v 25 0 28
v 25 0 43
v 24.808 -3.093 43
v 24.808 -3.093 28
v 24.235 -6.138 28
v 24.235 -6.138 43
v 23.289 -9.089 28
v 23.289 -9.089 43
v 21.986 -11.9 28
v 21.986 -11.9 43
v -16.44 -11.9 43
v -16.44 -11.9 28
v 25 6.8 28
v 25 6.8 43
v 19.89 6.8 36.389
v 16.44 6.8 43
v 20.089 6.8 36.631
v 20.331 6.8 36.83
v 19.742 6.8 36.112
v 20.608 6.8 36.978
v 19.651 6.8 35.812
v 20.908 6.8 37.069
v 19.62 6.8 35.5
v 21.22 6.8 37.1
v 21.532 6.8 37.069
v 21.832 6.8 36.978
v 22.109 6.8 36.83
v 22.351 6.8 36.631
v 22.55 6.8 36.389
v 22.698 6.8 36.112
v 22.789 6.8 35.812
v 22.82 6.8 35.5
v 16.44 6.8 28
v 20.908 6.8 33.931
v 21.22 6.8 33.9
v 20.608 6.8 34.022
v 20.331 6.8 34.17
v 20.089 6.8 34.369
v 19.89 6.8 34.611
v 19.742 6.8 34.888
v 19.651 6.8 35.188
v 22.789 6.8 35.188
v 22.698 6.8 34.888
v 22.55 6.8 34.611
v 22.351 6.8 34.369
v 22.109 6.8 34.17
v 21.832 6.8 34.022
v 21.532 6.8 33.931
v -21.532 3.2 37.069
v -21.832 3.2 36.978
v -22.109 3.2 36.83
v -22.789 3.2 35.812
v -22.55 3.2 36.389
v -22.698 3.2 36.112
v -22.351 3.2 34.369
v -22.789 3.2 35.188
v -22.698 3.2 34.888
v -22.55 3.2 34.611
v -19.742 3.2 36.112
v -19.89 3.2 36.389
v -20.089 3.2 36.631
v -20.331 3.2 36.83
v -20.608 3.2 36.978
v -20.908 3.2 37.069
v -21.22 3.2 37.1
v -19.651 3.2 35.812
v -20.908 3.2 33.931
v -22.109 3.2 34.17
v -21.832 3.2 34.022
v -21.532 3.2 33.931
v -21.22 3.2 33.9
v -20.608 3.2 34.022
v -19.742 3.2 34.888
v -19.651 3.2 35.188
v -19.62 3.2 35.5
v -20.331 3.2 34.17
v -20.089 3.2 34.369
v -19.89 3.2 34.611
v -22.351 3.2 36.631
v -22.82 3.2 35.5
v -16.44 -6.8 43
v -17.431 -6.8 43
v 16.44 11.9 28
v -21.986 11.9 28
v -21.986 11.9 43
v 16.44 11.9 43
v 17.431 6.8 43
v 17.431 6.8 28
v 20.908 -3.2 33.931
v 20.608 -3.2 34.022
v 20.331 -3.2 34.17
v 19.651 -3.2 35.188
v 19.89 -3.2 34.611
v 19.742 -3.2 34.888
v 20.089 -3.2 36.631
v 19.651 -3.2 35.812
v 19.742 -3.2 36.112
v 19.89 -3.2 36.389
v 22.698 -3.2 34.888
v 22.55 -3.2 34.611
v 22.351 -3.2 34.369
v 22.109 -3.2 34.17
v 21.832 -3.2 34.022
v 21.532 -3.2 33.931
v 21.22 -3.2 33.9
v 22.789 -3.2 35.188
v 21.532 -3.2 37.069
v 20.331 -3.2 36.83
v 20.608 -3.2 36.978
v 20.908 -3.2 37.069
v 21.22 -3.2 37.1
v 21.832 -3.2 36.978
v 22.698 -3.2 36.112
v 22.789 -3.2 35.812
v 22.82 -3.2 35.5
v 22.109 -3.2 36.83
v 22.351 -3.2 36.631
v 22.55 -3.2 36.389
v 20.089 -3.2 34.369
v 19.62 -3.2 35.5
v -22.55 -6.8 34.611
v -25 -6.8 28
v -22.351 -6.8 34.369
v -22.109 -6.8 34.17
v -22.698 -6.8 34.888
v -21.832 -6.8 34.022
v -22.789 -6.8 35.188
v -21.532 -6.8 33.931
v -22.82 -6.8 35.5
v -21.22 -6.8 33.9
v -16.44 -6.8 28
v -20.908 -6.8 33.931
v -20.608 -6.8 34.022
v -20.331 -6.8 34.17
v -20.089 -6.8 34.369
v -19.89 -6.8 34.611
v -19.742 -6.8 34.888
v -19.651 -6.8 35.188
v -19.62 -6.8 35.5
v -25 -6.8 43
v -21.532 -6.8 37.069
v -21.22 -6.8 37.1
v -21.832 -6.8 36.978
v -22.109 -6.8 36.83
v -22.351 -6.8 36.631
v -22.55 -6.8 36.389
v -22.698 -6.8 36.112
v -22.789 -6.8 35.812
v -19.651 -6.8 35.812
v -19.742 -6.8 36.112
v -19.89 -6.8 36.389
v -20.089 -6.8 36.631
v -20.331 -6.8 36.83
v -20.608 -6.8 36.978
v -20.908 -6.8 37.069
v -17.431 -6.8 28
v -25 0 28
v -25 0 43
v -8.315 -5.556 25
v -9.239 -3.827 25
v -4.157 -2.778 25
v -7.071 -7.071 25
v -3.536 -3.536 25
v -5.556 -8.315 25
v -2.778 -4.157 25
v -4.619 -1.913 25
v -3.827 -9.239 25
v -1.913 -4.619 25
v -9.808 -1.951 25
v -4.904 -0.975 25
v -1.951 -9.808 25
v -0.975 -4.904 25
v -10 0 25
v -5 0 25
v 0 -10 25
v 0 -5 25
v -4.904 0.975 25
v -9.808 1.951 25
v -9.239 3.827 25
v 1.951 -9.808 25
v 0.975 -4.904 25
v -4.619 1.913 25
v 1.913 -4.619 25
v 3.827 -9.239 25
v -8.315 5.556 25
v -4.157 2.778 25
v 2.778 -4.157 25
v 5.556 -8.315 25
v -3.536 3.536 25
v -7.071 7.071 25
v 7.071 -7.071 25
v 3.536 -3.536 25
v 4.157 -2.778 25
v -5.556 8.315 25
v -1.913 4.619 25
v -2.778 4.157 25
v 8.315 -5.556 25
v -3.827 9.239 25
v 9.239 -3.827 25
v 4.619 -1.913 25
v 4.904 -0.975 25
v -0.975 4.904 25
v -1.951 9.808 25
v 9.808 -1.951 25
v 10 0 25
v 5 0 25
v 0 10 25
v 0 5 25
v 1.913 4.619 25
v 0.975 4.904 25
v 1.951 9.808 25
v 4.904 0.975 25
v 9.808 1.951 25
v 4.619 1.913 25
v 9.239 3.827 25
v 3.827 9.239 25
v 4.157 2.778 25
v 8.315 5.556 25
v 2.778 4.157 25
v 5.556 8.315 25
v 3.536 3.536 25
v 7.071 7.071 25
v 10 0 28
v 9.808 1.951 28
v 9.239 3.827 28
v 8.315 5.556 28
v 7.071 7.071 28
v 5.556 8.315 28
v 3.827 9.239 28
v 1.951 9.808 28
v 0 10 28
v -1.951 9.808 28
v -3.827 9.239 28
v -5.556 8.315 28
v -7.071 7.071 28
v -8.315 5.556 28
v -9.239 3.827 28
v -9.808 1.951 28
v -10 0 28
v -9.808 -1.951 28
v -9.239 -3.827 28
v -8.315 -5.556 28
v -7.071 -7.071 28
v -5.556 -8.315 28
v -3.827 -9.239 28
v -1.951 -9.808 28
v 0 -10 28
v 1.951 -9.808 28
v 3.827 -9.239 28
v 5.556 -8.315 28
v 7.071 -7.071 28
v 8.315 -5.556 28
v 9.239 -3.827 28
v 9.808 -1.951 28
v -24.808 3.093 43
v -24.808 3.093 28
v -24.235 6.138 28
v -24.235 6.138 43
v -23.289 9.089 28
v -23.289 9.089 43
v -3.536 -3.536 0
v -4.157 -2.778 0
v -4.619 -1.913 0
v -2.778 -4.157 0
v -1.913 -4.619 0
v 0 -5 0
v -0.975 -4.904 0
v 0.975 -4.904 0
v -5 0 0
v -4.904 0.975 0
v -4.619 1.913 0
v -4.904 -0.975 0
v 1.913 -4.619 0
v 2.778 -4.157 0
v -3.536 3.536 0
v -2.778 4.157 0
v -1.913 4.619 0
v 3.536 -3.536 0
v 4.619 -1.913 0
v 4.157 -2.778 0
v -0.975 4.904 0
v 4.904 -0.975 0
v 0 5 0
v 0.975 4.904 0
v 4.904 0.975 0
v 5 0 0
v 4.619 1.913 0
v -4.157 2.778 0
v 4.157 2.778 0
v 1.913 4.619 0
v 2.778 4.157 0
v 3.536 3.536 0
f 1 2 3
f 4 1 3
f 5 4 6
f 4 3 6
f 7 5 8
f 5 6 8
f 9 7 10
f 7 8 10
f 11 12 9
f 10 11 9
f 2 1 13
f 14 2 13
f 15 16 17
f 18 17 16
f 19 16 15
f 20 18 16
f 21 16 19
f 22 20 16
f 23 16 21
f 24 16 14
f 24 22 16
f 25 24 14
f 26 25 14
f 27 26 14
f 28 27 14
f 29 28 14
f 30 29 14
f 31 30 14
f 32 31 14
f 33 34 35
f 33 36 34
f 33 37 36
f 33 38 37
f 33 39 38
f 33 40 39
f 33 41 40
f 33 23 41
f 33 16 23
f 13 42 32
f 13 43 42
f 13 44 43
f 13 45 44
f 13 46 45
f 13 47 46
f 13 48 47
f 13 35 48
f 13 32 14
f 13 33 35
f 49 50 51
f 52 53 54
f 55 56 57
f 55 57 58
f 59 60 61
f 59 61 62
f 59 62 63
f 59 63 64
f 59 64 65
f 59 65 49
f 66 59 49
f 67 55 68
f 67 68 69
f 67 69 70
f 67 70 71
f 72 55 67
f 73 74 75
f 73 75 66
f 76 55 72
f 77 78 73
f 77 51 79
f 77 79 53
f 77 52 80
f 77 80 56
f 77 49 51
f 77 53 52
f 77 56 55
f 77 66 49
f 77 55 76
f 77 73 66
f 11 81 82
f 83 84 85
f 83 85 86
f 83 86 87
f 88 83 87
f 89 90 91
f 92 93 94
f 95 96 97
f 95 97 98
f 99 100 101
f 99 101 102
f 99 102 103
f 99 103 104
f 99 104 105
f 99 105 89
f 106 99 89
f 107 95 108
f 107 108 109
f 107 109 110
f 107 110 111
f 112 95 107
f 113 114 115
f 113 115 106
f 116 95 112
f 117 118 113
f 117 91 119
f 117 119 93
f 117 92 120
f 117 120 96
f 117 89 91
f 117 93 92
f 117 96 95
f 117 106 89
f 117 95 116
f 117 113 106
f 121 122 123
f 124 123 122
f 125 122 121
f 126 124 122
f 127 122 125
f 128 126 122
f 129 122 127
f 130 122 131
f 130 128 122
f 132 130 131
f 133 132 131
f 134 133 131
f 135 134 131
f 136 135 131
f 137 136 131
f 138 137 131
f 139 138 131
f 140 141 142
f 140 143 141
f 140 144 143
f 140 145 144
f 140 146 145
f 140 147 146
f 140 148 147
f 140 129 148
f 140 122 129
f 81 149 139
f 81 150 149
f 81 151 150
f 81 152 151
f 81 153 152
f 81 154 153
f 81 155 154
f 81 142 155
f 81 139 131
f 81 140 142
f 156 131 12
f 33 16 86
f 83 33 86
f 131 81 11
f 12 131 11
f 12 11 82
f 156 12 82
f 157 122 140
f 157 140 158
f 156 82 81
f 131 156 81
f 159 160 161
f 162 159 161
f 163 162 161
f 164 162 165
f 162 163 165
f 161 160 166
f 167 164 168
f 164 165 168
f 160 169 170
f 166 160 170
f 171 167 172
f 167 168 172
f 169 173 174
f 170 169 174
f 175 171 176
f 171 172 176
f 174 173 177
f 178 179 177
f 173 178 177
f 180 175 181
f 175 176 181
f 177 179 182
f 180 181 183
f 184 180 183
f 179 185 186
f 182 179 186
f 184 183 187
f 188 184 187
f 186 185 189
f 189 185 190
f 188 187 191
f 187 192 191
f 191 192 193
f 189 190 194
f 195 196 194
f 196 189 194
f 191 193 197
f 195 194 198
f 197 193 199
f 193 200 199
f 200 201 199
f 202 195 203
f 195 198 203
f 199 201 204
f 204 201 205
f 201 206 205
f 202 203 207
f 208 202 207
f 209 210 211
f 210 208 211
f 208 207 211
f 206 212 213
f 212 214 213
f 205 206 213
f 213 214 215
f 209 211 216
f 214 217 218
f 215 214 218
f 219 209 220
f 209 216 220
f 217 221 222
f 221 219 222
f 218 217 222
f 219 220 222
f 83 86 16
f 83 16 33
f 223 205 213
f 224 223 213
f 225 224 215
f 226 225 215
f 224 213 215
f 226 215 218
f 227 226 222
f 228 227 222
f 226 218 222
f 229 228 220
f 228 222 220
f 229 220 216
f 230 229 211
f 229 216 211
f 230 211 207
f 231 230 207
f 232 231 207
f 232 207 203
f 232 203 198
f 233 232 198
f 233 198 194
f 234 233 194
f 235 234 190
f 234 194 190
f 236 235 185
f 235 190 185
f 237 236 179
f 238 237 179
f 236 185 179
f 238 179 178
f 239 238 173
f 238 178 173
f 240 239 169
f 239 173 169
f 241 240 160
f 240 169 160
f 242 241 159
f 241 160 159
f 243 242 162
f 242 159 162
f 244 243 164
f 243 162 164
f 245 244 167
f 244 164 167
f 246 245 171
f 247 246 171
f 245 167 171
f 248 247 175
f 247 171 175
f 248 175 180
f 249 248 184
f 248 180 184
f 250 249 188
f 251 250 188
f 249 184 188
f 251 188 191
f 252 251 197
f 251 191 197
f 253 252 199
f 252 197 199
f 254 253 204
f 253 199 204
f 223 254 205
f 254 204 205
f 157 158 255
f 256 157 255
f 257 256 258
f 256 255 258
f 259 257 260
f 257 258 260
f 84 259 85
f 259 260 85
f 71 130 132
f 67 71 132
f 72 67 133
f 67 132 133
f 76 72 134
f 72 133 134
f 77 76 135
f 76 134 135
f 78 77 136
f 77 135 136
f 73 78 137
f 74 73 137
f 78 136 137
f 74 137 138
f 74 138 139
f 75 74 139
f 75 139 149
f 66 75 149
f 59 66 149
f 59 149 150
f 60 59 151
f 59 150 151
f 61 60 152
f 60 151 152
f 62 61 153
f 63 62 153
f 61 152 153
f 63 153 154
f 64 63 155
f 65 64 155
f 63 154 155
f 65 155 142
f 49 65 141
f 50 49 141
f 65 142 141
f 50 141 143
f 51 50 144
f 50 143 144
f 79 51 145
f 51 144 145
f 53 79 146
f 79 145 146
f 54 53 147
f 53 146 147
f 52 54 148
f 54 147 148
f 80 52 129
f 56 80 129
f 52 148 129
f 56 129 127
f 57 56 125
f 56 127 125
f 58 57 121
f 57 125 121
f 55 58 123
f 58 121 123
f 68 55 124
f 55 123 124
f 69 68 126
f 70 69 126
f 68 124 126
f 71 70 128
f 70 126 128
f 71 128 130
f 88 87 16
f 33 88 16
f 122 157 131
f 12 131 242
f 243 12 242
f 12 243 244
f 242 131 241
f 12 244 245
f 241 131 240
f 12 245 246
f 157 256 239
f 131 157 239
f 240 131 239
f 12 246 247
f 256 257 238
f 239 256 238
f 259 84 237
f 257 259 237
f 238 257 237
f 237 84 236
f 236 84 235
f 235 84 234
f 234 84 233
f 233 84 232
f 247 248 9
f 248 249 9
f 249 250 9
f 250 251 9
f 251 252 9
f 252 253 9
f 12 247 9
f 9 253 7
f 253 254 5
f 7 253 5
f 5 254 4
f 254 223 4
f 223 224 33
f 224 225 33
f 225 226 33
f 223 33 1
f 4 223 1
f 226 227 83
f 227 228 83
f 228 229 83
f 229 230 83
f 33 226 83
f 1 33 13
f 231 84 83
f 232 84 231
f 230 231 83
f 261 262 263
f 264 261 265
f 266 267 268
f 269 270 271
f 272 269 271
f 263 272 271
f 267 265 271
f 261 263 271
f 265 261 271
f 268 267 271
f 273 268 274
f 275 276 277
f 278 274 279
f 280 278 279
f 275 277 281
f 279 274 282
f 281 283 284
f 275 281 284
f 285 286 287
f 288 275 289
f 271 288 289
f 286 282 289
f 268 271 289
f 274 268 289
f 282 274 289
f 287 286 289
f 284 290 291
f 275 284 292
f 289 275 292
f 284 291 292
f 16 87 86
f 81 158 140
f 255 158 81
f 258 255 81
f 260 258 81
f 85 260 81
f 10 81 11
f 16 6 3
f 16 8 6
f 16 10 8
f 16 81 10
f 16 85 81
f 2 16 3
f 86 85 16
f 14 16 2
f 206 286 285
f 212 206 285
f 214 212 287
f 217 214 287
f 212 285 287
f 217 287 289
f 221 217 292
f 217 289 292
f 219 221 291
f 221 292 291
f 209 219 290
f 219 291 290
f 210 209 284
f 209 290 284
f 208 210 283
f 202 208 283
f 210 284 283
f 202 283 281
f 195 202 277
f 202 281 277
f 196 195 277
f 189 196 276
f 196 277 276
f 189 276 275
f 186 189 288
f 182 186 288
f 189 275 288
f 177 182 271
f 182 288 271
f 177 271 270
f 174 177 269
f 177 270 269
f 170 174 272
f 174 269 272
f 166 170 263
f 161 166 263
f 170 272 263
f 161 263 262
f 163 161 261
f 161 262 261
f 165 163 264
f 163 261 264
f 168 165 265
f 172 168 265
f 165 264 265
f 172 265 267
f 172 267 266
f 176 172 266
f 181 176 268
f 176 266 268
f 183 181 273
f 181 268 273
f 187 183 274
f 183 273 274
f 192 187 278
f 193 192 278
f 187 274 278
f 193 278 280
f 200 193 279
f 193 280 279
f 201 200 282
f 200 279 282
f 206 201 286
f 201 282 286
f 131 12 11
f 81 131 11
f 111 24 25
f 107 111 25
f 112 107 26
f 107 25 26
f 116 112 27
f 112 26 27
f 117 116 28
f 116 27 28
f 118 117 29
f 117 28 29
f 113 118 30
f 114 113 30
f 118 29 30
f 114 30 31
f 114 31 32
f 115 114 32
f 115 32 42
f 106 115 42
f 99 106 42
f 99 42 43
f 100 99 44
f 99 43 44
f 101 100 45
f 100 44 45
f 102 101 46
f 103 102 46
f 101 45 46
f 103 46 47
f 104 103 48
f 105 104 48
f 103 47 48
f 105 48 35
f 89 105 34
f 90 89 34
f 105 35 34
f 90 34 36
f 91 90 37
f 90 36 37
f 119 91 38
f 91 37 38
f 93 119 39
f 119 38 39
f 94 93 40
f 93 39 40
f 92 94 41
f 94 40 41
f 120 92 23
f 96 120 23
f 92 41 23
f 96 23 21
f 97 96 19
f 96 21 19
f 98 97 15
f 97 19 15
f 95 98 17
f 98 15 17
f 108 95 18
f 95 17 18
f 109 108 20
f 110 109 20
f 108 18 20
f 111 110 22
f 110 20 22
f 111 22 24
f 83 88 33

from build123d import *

# Parameters (mm, degrees)
SKETCH_1_R          = 5
EXTRUDE_1_DEPTH     = 25
SKETCH_2_R          = 10
EXTRUDE_2_DEPTH     = 3
SKETCH_3_W          = 50
SKETCH_3_H          = 23.8
EXTRUDE_3_DEPTH     = 15
CUT_EXTRUDE_1_DEPTH = 52.143034716
SKETCH_5_W          = 8.56
SKETCH_5_H          = 15
CUT_EXTRUDE_2_DEPTH = 5.1
SKETCH_6_R          = 1.6
CUT_EXTRUDE_3_DEPTH = 10
SKETCH_7_W          = 8.56
SKETCH_7_H          = 15
CUT_EXTRUDE_4_DEPTH = 5.1
SKETCH_8_R          = 1.6
CUT_EXTRUDE_5_DEPTH = 10
EXTRUDE_4_DEPTH     = 15
EXTRUDE_4_2_DEPTH   = 15


with BuildPart() as part:
    # 草图1 → 凸台-拉伸1 (new body)
    with BuildSketch(Plane.XY):
        Circle(SKETCH_1_R)
    extrude(amount=EXTRUDE_1_DEPTH)

    # 草图2 → 凸台-拉伸2 (add)
    with BuildSketch(Plane.XY.offset(25)):
        Circle(SKETCH_2_R)
    extrude(amount=EXTRUDE_2_DEPTH)

    # 草图3 → 凸台-拉伸3 (add)
    with BuildSketch(Plane.XY.offset(28)):
        Rectangle(SKETCH_3_W, SKETCH_3_H)
    extrude(amount=EXTRUDE_3_DEPTH)

    # 草图4 → 切除-拉伸1 (cut, through all)
    with BuildSketch(Plane.XY.offset(43)):
        with BuildLine():
            Line((-25, 11.9), (-25, 0))
            ThreePointArc((-25, 0), (-24.234823084, 6.137862013), (-21.986131993, 11.9))
            Line((-21.986131993, 11.9), (-25, 11.9))
        make_face()
        with BuildLine():
            Line((21.986131993, -11.9), (25, -11.9))
            Line((25, -11.9), (25, 0))
            ThreePointArc((25, 0), (24.234823084, -6.137862013), (21.986131993, -11.9))
        make_face()
    extrude(amount=-CUT_EXTRUDE_1_DEPTH, mode=Mode.SUBTRACT)

    # 草图5 → 切除-拉伸2 (cut)
    with BuildSketch(Plane(origin=(0, 11.9, 0), x_dir=(1, 0, 0), z_dir=(0, 1, 0))):
        with Locations((20.72, -35.5)):
            Rectangle(SKETCH_5_W, SKETCH_5_H)
    extrude(amount=-CUT_EXTRUDE_2_DEPTH, mode=Mode.SUBTRACT)

    # 草图6 → 切除-拉伸3 (cut)
    with BuildSketch(Plane(origin=(0, 6.8, 0), x_dir=(1, 0, 0), z_dir=(0, 1, 0))):
        with Locations(Location((21.22, -35.5, 0), (0, 0, 270))):
            Circle(SKETCH_6_R)
    extrude(amount=-CUT_EXTRUDE_3_DEPTH, mode=Mode.SUBTRACT)

    # 草图7 → 切除-拉伸4 (cut)
    with BuildSketch(Plane.XZ.offset(11.9)):
        with Locations((-20.72, 35.5)):
            Rectangle(SKETCH_7_W, SKETCH_7_H)
    extrude(amount=-CUT_EXTRUDE_4_DEPTH, mode=Mode.SUBTRACT)

    # 草图8 → 切除-拉伸5 (cut)
    with BuildSketch(Plane.XZ.offset(6.8)):
        with Locations(Location((-21.22, 35.5, 0), (0, 0, 270))):
            Circle(SKETCH_8_R)
    extrude(amount=-CUT_EXTRUDE_5_DEPTH, mode=Mode.SUBTRACT)


with BuildPart() as body_2:
    # 草图9 → 凸台-拉伸4 (new body)
    with BuildSketch(Plane.XY.offset(43)):
        Polygon((16.44, 11.9), (17.431339577, 6.8), (16.44, 6.8), align=None)
    extrude(amount=-EXTRUDE_4_DEPTH)


with BuildPart() as body_3:
    # 草图9 → Extrude 4 2 (new body)
    with BuildSketch(Plane.XY.offset(43)):
        Polygon((-16.44, -11.9), (-17.431339577, -6.8), (-16.44, -6.8), align=None)
    extrude(amount=-EXTRUDE_4_2_DEPTH)


solid = Compound([part.part, body_2.part, body_3.part])
